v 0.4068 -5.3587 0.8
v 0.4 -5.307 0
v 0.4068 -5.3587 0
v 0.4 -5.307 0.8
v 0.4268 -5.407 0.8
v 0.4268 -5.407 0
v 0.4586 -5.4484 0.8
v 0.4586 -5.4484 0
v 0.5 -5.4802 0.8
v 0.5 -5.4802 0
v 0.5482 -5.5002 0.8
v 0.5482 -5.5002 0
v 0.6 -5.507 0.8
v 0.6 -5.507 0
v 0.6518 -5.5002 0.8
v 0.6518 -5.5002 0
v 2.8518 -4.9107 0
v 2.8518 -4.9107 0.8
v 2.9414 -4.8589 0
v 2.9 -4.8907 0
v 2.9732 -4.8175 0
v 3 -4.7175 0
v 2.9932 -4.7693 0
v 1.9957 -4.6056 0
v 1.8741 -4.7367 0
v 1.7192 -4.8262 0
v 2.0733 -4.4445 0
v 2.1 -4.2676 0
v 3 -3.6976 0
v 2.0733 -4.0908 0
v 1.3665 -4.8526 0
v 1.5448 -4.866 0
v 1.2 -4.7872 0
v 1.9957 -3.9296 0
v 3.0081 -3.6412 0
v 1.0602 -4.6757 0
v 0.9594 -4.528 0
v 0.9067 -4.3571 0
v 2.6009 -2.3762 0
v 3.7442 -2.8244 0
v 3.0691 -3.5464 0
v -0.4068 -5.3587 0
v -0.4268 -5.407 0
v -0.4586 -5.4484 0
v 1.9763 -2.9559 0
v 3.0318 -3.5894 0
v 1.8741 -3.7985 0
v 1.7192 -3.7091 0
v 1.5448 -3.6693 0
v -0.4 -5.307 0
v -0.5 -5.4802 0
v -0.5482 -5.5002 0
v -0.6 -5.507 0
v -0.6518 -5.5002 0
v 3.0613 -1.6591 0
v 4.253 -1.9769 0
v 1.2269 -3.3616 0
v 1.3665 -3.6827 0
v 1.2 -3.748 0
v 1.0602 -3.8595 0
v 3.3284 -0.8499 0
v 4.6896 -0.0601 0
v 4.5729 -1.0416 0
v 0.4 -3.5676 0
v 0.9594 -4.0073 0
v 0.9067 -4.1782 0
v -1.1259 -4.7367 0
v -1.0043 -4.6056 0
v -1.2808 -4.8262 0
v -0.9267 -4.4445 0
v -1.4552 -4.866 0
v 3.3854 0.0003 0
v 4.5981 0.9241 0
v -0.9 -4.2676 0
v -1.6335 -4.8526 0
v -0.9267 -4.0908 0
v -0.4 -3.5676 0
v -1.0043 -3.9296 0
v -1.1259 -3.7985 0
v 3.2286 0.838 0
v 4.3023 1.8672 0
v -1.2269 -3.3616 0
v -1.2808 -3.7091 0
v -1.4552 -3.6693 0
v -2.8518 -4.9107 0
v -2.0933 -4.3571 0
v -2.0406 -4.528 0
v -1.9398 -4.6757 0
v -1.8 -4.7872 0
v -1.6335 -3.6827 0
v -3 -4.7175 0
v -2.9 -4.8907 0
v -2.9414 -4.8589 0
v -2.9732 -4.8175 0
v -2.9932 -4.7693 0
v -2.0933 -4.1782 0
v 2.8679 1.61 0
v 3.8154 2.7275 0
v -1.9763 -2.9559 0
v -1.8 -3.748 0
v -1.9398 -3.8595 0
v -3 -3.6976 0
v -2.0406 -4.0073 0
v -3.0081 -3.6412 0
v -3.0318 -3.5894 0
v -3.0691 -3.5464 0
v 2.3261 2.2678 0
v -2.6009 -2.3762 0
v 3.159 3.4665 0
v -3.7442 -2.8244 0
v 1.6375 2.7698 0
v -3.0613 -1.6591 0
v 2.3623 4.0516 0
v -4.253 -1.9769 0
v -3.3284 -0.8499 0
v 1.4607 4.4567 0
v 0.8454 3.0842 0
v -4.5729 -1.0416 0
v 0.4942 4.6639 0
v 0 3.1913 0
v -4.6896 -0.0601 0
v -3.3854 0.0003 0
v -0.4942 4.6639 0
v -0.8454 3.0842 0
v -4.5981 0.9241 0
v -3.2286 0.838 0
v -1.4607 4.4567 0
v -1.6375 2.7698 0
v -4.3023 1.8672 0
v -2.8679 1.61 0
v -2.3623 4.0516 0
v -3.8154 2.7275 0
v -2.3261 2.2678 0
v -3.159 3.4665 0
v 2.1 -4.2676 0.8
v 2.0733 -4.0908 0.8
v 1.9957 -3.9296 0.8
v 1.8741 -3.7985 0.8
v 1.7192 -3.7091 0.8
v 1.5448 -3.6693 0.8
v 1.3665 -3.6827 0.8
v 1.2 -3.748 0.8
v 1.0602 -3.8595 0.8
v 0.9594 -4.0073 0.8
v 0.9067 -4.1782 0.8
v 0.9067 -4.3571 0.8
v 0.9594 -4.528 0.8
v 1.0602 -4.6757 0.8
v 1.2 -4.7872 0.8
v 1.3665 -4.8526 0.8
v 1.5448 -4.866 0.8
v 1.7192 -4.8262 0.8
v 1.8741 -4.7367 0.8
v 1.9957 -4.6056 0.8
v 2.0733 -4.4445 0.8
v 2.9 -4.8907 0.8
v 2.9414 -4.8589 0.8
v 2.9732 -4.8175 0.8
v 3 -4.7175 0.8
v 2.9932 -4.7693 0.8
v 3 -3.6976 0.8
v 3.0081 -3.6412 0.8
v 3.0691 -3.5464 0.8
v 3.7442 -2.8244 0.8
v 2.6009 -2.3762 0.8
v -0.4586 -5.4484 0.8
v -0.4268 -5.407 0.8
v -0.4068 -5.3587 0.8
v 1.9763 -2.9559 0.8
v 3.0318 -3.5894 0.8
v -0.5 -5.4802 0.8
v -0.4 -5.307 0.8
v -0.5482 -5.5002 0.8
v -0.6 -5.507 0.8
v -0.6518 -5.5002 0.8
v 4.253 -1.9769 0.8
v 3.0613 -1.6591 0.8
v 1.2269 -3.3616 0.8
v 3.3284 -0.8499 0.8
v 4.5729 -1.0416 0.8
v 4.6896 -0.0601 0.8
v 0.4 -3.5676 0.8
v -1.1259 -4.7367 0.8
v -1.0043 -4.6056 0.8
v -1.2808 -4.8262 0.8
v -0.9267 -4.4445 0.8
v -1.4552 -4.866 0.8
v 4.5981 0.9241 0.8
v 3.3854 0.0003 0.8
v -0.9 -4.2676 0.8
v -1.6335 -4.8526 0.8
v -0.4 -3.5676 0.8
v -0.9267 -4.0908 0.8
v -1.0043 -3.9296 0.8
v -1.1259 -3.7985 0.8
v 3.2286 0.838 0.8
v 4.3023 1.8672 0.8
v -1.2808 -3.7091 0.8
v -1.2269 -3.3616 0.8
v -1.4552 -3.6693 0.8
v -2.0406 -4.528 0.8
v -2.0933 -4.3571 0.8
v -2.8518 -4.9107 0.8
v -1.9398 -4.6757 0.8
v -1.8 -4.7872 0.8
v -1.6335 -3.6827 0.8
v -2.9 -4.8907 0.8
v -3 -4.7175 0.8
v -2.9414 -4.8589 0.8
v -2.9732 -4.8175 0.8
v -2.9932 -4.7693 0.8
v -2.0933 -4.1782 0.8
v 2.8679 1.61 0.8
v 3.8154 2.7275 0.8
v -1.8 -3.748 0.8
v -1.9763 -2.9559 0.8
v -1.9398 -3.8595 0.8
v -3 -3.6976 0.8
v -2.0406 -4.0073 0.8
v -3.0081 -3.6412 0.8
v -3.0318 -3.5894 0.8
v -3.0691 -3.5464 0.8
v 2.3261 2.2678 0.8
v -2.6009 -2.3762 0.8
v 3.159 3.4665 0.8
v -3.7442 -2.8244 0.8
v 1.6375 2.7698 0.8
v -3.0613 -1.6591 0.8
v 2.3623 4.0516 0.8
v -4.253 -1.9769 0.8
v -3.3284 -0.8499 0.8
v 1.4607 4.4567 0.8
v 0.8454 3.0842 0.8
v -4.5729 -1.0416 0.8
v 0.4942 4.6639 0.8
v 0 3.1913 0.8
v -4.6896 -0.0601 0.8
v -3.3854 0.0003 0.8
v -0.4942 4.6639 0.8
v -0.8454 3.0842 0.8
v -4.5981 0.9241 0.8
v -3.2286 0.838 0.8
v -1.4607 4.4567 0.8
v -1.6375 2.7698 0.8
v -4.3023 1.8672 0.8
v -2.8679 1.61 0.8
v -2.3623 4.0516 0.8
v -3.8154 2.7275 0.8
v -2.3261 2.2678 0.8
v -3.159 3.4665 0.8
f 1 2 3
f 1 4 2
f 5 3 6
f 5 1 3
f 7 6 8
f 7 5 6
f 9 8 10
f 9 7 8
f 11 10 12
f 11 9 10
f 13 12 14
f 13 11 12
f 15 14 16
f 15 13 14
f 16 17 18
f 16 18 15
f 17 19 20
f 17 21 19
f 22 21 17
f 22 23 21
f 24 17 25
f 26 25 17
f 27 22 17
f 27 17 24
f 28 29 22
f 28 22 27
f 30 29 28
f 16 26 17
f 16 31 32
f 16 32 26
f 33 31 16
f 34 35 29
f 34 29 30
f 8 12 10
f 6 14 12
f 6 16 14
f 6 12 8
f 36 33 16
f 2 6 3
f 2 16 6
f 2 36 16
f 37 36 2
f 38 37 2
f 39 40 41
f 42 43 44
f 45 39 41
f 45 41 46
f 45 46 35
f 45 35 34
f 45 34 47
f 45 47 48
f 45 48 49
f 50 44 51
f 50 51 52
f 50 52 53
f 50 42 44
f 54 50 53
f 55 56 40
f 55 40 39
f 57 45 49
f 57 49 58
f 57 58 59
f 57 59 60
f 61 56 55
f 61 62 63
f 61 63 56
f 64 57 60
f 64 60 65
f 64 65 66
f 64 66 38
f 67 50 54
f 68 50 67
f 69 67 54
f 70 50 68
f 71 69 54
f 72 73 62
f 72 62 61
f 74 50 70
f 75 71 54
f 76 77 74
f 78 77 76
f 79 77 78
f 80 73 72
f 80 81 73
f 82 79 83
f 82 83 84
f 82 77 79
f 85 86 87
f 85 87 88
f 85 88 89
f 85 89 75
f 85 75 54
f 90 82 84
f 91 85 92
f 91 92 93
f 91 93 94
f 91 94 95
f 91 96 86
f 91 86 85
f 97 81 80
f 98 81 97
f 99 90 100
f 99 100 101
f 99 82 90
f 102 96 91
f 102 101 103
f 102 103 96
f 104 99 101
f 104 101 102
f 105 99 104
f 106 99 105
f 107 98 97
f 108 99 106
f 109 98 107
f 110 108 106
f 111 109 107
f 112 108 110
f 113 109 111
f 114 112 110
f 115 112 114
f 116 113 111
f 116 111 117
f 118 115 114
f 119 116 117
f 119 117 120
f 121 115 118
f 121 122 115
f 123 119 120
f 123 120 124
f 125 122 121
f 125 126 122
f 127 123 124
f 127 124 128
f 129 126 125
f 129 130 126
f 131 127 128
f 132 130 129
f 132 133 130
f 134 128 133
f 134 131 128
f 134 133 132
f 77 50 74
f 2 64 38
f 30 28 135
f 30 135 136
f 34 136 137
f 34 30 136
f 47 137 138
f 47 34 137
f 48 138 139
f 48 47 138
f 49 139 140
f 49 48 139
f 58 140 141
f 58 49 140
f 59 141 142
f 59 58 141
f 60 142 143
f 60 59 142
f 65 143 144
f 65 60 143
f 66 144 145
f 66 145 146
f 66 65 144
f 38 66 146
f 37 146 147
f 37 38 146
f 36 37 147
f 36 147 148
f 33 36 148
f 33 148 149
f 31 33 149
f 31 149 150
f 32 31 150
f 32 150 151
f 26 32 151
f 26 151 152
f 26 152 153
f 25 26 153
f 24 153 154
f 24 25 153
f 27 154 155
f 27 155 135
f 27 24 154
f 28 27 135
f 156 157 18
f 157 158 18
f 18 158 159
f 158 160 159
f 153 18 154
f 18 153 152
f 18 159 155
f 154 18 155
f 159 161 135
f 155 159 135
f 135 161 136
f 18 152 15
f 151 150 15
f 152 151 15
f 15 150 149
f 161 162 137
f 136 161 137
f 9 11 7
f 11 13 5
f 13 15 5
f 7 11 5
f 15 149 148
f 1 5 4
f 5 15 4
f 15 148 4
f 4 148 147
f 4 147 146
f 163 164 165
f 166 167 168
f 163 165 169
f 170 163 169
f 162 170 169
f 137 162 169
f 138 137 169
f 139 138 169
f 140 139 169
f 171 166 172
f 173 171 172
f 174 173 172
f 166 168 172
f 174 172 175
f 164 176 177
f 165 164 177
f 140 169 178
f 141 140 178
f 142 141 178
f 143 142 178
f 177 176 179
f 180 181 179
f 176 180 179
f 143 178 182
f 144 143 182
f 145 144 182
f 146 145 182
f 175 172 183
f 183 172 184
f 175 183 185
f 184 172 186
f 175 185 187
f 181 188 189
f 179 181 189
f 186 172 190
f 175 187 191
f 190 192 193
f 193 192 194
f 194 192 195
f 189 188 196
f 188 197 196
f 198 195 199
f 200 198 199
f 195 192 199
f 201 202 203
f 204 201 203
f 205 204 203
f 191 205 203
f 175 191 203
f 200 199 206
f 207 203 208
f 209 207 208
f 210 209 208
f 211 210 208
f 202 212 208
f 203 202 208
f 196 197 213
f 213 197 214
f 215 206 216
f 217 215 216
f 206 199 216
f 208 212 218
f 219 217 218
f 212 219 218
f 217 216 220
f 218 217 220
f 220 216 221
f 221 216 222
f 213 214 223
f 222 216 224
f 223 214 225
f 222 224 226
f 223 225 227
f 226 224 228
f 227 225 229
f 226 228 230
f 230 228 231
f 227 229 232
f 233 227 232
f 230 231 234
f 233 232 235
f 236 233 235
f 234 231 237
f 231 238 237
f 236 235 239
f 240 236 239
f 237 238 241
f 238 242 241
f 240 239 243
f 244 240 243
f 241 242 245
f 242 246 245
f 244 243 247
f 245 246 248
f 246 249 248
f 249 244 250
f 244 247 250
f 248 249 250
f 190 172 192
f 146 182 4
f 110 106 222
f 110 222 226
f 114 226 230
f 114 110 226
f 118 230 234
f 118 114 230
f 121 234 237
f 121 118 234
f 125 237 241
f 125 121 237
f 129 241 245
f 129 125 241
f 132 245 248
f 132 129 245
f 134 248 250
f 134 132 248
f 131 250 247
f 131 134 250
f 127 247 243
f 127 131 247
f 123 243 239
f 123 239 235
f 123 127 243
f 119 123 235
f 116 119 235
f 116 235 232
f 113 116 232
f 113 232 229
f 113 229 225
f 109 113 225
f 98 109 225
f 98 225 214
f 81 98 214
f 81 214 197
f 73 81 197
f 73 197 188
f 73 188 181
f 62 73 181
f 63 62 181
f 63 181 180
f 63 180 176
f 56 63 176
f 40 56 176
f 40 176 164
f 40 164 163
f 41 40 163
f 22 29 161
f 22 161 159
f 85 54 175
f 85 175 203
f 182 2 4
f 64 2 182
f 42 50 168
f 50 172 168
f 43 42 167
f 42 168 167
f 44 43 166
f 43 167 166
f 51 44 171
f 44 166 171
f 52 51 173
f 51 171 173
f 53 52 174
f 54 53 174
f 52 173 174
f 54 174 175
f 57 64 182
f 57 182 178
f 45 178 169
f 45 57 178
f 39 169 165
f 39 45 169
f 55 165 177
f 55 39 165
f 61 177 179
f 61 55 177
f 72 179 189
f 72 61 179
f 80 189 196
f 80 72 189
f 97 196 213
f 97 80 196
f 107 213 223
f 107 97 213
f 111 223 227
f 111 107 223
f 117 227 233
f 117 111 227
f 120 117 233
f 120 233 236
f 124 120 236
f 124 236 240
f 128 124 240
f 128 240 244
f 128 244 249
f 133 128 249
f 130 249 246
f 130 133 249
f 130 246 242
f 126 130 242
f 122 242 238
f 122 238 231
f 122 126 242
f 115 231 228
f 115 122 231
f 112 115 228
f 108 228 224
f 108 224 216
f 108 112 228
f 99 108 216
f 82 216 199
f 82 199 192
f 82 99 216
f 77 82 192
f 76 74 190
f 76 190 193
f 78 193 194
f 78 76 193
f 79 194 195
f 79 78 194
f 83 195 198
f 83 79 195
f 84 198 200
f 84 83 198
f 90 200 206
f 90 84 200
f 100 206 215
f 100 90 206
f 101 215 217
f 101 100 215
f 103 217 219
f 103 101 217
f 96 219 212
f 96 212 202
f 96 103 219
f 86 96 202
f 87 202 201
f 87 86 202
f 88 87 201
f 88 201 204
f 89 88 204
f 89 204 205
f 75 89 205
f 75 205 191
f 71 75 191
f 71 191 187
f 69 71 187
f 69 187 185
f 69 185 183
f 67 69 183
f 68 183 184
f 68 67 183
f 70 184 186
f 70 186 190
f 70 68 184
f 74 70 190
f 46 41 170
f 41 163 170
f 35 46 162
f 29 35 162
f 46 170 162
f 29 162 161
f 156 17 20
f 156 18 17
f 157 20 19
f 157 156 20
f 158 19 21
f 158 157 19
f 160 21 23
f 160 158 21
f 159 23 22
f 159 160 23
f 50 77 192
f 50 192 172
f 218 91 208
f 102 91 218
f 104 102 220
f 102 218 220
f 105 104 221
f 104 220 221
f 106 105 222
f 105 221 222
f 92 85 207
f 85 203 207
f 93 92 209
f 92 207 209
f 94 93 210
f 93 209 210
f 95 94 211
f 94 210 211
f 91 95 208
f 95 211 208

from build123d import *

# Parameters (mm, degrees)
SKETCH_1_R      = 0.6
EXTRUDE_1_DEPTH = 0.8
FILLET_1_R      = 0.2


with BuildPart() as part:
    # 草图1 → 凸台-拉伸1 (new body)
    with BuildSketch(Plane.XY):
        with BuildLine():
            Line((-0.4, -3.567629953), (-0.4, -5.567629953))
            Line((-0.4, -5.567629953), (-3, -4.870962053))
            Line((-3, -4.870962053), (-3, -3.605010402))
            ThreePointArc((-3, -3.605010402), (0, 4.69), (3, -3.605010402))
            Line((3, -3.605010402), (3, -4.870962053))
            Line((3, -4.870962053), (0.4, -5.567629953))
            Line((0.4, -5.567629953), (0.4, -3.567629953))
            ThreePointArc((0.4, -3.567629953), (0, 3.191302331), (-0.4, -3.567629953))
        make_face()
        with Locations((-1.5, -4.267629953)):
            Circle(SKETCH_1_R, mode=Mode.SUBTRACT)
        with Locations((1.5, -4.267629953)):
            Circle(SKETCH_1_R, mode=Mode.SUBTRACT)
    extrude(amount=EXTRUDE_1_DEPTH)

    # 圆角1
    fillet_1_edges = [part.edges().sort_by_distance(p)[0] for p in [
        (-0.4, -5.567629953, 0.4),
        (-3, -4.870962053, 0.4),
        (-3, -3.605010402, 0.4),
        (3, -3.605010402, 0.4),
        (3, -4.870962053, 0.4),
        (0.4, -5.567629953, 0.4),
    ]]
    fillet(fillet_1_edges, radius=FILLET_1_R)


solid = part.part
